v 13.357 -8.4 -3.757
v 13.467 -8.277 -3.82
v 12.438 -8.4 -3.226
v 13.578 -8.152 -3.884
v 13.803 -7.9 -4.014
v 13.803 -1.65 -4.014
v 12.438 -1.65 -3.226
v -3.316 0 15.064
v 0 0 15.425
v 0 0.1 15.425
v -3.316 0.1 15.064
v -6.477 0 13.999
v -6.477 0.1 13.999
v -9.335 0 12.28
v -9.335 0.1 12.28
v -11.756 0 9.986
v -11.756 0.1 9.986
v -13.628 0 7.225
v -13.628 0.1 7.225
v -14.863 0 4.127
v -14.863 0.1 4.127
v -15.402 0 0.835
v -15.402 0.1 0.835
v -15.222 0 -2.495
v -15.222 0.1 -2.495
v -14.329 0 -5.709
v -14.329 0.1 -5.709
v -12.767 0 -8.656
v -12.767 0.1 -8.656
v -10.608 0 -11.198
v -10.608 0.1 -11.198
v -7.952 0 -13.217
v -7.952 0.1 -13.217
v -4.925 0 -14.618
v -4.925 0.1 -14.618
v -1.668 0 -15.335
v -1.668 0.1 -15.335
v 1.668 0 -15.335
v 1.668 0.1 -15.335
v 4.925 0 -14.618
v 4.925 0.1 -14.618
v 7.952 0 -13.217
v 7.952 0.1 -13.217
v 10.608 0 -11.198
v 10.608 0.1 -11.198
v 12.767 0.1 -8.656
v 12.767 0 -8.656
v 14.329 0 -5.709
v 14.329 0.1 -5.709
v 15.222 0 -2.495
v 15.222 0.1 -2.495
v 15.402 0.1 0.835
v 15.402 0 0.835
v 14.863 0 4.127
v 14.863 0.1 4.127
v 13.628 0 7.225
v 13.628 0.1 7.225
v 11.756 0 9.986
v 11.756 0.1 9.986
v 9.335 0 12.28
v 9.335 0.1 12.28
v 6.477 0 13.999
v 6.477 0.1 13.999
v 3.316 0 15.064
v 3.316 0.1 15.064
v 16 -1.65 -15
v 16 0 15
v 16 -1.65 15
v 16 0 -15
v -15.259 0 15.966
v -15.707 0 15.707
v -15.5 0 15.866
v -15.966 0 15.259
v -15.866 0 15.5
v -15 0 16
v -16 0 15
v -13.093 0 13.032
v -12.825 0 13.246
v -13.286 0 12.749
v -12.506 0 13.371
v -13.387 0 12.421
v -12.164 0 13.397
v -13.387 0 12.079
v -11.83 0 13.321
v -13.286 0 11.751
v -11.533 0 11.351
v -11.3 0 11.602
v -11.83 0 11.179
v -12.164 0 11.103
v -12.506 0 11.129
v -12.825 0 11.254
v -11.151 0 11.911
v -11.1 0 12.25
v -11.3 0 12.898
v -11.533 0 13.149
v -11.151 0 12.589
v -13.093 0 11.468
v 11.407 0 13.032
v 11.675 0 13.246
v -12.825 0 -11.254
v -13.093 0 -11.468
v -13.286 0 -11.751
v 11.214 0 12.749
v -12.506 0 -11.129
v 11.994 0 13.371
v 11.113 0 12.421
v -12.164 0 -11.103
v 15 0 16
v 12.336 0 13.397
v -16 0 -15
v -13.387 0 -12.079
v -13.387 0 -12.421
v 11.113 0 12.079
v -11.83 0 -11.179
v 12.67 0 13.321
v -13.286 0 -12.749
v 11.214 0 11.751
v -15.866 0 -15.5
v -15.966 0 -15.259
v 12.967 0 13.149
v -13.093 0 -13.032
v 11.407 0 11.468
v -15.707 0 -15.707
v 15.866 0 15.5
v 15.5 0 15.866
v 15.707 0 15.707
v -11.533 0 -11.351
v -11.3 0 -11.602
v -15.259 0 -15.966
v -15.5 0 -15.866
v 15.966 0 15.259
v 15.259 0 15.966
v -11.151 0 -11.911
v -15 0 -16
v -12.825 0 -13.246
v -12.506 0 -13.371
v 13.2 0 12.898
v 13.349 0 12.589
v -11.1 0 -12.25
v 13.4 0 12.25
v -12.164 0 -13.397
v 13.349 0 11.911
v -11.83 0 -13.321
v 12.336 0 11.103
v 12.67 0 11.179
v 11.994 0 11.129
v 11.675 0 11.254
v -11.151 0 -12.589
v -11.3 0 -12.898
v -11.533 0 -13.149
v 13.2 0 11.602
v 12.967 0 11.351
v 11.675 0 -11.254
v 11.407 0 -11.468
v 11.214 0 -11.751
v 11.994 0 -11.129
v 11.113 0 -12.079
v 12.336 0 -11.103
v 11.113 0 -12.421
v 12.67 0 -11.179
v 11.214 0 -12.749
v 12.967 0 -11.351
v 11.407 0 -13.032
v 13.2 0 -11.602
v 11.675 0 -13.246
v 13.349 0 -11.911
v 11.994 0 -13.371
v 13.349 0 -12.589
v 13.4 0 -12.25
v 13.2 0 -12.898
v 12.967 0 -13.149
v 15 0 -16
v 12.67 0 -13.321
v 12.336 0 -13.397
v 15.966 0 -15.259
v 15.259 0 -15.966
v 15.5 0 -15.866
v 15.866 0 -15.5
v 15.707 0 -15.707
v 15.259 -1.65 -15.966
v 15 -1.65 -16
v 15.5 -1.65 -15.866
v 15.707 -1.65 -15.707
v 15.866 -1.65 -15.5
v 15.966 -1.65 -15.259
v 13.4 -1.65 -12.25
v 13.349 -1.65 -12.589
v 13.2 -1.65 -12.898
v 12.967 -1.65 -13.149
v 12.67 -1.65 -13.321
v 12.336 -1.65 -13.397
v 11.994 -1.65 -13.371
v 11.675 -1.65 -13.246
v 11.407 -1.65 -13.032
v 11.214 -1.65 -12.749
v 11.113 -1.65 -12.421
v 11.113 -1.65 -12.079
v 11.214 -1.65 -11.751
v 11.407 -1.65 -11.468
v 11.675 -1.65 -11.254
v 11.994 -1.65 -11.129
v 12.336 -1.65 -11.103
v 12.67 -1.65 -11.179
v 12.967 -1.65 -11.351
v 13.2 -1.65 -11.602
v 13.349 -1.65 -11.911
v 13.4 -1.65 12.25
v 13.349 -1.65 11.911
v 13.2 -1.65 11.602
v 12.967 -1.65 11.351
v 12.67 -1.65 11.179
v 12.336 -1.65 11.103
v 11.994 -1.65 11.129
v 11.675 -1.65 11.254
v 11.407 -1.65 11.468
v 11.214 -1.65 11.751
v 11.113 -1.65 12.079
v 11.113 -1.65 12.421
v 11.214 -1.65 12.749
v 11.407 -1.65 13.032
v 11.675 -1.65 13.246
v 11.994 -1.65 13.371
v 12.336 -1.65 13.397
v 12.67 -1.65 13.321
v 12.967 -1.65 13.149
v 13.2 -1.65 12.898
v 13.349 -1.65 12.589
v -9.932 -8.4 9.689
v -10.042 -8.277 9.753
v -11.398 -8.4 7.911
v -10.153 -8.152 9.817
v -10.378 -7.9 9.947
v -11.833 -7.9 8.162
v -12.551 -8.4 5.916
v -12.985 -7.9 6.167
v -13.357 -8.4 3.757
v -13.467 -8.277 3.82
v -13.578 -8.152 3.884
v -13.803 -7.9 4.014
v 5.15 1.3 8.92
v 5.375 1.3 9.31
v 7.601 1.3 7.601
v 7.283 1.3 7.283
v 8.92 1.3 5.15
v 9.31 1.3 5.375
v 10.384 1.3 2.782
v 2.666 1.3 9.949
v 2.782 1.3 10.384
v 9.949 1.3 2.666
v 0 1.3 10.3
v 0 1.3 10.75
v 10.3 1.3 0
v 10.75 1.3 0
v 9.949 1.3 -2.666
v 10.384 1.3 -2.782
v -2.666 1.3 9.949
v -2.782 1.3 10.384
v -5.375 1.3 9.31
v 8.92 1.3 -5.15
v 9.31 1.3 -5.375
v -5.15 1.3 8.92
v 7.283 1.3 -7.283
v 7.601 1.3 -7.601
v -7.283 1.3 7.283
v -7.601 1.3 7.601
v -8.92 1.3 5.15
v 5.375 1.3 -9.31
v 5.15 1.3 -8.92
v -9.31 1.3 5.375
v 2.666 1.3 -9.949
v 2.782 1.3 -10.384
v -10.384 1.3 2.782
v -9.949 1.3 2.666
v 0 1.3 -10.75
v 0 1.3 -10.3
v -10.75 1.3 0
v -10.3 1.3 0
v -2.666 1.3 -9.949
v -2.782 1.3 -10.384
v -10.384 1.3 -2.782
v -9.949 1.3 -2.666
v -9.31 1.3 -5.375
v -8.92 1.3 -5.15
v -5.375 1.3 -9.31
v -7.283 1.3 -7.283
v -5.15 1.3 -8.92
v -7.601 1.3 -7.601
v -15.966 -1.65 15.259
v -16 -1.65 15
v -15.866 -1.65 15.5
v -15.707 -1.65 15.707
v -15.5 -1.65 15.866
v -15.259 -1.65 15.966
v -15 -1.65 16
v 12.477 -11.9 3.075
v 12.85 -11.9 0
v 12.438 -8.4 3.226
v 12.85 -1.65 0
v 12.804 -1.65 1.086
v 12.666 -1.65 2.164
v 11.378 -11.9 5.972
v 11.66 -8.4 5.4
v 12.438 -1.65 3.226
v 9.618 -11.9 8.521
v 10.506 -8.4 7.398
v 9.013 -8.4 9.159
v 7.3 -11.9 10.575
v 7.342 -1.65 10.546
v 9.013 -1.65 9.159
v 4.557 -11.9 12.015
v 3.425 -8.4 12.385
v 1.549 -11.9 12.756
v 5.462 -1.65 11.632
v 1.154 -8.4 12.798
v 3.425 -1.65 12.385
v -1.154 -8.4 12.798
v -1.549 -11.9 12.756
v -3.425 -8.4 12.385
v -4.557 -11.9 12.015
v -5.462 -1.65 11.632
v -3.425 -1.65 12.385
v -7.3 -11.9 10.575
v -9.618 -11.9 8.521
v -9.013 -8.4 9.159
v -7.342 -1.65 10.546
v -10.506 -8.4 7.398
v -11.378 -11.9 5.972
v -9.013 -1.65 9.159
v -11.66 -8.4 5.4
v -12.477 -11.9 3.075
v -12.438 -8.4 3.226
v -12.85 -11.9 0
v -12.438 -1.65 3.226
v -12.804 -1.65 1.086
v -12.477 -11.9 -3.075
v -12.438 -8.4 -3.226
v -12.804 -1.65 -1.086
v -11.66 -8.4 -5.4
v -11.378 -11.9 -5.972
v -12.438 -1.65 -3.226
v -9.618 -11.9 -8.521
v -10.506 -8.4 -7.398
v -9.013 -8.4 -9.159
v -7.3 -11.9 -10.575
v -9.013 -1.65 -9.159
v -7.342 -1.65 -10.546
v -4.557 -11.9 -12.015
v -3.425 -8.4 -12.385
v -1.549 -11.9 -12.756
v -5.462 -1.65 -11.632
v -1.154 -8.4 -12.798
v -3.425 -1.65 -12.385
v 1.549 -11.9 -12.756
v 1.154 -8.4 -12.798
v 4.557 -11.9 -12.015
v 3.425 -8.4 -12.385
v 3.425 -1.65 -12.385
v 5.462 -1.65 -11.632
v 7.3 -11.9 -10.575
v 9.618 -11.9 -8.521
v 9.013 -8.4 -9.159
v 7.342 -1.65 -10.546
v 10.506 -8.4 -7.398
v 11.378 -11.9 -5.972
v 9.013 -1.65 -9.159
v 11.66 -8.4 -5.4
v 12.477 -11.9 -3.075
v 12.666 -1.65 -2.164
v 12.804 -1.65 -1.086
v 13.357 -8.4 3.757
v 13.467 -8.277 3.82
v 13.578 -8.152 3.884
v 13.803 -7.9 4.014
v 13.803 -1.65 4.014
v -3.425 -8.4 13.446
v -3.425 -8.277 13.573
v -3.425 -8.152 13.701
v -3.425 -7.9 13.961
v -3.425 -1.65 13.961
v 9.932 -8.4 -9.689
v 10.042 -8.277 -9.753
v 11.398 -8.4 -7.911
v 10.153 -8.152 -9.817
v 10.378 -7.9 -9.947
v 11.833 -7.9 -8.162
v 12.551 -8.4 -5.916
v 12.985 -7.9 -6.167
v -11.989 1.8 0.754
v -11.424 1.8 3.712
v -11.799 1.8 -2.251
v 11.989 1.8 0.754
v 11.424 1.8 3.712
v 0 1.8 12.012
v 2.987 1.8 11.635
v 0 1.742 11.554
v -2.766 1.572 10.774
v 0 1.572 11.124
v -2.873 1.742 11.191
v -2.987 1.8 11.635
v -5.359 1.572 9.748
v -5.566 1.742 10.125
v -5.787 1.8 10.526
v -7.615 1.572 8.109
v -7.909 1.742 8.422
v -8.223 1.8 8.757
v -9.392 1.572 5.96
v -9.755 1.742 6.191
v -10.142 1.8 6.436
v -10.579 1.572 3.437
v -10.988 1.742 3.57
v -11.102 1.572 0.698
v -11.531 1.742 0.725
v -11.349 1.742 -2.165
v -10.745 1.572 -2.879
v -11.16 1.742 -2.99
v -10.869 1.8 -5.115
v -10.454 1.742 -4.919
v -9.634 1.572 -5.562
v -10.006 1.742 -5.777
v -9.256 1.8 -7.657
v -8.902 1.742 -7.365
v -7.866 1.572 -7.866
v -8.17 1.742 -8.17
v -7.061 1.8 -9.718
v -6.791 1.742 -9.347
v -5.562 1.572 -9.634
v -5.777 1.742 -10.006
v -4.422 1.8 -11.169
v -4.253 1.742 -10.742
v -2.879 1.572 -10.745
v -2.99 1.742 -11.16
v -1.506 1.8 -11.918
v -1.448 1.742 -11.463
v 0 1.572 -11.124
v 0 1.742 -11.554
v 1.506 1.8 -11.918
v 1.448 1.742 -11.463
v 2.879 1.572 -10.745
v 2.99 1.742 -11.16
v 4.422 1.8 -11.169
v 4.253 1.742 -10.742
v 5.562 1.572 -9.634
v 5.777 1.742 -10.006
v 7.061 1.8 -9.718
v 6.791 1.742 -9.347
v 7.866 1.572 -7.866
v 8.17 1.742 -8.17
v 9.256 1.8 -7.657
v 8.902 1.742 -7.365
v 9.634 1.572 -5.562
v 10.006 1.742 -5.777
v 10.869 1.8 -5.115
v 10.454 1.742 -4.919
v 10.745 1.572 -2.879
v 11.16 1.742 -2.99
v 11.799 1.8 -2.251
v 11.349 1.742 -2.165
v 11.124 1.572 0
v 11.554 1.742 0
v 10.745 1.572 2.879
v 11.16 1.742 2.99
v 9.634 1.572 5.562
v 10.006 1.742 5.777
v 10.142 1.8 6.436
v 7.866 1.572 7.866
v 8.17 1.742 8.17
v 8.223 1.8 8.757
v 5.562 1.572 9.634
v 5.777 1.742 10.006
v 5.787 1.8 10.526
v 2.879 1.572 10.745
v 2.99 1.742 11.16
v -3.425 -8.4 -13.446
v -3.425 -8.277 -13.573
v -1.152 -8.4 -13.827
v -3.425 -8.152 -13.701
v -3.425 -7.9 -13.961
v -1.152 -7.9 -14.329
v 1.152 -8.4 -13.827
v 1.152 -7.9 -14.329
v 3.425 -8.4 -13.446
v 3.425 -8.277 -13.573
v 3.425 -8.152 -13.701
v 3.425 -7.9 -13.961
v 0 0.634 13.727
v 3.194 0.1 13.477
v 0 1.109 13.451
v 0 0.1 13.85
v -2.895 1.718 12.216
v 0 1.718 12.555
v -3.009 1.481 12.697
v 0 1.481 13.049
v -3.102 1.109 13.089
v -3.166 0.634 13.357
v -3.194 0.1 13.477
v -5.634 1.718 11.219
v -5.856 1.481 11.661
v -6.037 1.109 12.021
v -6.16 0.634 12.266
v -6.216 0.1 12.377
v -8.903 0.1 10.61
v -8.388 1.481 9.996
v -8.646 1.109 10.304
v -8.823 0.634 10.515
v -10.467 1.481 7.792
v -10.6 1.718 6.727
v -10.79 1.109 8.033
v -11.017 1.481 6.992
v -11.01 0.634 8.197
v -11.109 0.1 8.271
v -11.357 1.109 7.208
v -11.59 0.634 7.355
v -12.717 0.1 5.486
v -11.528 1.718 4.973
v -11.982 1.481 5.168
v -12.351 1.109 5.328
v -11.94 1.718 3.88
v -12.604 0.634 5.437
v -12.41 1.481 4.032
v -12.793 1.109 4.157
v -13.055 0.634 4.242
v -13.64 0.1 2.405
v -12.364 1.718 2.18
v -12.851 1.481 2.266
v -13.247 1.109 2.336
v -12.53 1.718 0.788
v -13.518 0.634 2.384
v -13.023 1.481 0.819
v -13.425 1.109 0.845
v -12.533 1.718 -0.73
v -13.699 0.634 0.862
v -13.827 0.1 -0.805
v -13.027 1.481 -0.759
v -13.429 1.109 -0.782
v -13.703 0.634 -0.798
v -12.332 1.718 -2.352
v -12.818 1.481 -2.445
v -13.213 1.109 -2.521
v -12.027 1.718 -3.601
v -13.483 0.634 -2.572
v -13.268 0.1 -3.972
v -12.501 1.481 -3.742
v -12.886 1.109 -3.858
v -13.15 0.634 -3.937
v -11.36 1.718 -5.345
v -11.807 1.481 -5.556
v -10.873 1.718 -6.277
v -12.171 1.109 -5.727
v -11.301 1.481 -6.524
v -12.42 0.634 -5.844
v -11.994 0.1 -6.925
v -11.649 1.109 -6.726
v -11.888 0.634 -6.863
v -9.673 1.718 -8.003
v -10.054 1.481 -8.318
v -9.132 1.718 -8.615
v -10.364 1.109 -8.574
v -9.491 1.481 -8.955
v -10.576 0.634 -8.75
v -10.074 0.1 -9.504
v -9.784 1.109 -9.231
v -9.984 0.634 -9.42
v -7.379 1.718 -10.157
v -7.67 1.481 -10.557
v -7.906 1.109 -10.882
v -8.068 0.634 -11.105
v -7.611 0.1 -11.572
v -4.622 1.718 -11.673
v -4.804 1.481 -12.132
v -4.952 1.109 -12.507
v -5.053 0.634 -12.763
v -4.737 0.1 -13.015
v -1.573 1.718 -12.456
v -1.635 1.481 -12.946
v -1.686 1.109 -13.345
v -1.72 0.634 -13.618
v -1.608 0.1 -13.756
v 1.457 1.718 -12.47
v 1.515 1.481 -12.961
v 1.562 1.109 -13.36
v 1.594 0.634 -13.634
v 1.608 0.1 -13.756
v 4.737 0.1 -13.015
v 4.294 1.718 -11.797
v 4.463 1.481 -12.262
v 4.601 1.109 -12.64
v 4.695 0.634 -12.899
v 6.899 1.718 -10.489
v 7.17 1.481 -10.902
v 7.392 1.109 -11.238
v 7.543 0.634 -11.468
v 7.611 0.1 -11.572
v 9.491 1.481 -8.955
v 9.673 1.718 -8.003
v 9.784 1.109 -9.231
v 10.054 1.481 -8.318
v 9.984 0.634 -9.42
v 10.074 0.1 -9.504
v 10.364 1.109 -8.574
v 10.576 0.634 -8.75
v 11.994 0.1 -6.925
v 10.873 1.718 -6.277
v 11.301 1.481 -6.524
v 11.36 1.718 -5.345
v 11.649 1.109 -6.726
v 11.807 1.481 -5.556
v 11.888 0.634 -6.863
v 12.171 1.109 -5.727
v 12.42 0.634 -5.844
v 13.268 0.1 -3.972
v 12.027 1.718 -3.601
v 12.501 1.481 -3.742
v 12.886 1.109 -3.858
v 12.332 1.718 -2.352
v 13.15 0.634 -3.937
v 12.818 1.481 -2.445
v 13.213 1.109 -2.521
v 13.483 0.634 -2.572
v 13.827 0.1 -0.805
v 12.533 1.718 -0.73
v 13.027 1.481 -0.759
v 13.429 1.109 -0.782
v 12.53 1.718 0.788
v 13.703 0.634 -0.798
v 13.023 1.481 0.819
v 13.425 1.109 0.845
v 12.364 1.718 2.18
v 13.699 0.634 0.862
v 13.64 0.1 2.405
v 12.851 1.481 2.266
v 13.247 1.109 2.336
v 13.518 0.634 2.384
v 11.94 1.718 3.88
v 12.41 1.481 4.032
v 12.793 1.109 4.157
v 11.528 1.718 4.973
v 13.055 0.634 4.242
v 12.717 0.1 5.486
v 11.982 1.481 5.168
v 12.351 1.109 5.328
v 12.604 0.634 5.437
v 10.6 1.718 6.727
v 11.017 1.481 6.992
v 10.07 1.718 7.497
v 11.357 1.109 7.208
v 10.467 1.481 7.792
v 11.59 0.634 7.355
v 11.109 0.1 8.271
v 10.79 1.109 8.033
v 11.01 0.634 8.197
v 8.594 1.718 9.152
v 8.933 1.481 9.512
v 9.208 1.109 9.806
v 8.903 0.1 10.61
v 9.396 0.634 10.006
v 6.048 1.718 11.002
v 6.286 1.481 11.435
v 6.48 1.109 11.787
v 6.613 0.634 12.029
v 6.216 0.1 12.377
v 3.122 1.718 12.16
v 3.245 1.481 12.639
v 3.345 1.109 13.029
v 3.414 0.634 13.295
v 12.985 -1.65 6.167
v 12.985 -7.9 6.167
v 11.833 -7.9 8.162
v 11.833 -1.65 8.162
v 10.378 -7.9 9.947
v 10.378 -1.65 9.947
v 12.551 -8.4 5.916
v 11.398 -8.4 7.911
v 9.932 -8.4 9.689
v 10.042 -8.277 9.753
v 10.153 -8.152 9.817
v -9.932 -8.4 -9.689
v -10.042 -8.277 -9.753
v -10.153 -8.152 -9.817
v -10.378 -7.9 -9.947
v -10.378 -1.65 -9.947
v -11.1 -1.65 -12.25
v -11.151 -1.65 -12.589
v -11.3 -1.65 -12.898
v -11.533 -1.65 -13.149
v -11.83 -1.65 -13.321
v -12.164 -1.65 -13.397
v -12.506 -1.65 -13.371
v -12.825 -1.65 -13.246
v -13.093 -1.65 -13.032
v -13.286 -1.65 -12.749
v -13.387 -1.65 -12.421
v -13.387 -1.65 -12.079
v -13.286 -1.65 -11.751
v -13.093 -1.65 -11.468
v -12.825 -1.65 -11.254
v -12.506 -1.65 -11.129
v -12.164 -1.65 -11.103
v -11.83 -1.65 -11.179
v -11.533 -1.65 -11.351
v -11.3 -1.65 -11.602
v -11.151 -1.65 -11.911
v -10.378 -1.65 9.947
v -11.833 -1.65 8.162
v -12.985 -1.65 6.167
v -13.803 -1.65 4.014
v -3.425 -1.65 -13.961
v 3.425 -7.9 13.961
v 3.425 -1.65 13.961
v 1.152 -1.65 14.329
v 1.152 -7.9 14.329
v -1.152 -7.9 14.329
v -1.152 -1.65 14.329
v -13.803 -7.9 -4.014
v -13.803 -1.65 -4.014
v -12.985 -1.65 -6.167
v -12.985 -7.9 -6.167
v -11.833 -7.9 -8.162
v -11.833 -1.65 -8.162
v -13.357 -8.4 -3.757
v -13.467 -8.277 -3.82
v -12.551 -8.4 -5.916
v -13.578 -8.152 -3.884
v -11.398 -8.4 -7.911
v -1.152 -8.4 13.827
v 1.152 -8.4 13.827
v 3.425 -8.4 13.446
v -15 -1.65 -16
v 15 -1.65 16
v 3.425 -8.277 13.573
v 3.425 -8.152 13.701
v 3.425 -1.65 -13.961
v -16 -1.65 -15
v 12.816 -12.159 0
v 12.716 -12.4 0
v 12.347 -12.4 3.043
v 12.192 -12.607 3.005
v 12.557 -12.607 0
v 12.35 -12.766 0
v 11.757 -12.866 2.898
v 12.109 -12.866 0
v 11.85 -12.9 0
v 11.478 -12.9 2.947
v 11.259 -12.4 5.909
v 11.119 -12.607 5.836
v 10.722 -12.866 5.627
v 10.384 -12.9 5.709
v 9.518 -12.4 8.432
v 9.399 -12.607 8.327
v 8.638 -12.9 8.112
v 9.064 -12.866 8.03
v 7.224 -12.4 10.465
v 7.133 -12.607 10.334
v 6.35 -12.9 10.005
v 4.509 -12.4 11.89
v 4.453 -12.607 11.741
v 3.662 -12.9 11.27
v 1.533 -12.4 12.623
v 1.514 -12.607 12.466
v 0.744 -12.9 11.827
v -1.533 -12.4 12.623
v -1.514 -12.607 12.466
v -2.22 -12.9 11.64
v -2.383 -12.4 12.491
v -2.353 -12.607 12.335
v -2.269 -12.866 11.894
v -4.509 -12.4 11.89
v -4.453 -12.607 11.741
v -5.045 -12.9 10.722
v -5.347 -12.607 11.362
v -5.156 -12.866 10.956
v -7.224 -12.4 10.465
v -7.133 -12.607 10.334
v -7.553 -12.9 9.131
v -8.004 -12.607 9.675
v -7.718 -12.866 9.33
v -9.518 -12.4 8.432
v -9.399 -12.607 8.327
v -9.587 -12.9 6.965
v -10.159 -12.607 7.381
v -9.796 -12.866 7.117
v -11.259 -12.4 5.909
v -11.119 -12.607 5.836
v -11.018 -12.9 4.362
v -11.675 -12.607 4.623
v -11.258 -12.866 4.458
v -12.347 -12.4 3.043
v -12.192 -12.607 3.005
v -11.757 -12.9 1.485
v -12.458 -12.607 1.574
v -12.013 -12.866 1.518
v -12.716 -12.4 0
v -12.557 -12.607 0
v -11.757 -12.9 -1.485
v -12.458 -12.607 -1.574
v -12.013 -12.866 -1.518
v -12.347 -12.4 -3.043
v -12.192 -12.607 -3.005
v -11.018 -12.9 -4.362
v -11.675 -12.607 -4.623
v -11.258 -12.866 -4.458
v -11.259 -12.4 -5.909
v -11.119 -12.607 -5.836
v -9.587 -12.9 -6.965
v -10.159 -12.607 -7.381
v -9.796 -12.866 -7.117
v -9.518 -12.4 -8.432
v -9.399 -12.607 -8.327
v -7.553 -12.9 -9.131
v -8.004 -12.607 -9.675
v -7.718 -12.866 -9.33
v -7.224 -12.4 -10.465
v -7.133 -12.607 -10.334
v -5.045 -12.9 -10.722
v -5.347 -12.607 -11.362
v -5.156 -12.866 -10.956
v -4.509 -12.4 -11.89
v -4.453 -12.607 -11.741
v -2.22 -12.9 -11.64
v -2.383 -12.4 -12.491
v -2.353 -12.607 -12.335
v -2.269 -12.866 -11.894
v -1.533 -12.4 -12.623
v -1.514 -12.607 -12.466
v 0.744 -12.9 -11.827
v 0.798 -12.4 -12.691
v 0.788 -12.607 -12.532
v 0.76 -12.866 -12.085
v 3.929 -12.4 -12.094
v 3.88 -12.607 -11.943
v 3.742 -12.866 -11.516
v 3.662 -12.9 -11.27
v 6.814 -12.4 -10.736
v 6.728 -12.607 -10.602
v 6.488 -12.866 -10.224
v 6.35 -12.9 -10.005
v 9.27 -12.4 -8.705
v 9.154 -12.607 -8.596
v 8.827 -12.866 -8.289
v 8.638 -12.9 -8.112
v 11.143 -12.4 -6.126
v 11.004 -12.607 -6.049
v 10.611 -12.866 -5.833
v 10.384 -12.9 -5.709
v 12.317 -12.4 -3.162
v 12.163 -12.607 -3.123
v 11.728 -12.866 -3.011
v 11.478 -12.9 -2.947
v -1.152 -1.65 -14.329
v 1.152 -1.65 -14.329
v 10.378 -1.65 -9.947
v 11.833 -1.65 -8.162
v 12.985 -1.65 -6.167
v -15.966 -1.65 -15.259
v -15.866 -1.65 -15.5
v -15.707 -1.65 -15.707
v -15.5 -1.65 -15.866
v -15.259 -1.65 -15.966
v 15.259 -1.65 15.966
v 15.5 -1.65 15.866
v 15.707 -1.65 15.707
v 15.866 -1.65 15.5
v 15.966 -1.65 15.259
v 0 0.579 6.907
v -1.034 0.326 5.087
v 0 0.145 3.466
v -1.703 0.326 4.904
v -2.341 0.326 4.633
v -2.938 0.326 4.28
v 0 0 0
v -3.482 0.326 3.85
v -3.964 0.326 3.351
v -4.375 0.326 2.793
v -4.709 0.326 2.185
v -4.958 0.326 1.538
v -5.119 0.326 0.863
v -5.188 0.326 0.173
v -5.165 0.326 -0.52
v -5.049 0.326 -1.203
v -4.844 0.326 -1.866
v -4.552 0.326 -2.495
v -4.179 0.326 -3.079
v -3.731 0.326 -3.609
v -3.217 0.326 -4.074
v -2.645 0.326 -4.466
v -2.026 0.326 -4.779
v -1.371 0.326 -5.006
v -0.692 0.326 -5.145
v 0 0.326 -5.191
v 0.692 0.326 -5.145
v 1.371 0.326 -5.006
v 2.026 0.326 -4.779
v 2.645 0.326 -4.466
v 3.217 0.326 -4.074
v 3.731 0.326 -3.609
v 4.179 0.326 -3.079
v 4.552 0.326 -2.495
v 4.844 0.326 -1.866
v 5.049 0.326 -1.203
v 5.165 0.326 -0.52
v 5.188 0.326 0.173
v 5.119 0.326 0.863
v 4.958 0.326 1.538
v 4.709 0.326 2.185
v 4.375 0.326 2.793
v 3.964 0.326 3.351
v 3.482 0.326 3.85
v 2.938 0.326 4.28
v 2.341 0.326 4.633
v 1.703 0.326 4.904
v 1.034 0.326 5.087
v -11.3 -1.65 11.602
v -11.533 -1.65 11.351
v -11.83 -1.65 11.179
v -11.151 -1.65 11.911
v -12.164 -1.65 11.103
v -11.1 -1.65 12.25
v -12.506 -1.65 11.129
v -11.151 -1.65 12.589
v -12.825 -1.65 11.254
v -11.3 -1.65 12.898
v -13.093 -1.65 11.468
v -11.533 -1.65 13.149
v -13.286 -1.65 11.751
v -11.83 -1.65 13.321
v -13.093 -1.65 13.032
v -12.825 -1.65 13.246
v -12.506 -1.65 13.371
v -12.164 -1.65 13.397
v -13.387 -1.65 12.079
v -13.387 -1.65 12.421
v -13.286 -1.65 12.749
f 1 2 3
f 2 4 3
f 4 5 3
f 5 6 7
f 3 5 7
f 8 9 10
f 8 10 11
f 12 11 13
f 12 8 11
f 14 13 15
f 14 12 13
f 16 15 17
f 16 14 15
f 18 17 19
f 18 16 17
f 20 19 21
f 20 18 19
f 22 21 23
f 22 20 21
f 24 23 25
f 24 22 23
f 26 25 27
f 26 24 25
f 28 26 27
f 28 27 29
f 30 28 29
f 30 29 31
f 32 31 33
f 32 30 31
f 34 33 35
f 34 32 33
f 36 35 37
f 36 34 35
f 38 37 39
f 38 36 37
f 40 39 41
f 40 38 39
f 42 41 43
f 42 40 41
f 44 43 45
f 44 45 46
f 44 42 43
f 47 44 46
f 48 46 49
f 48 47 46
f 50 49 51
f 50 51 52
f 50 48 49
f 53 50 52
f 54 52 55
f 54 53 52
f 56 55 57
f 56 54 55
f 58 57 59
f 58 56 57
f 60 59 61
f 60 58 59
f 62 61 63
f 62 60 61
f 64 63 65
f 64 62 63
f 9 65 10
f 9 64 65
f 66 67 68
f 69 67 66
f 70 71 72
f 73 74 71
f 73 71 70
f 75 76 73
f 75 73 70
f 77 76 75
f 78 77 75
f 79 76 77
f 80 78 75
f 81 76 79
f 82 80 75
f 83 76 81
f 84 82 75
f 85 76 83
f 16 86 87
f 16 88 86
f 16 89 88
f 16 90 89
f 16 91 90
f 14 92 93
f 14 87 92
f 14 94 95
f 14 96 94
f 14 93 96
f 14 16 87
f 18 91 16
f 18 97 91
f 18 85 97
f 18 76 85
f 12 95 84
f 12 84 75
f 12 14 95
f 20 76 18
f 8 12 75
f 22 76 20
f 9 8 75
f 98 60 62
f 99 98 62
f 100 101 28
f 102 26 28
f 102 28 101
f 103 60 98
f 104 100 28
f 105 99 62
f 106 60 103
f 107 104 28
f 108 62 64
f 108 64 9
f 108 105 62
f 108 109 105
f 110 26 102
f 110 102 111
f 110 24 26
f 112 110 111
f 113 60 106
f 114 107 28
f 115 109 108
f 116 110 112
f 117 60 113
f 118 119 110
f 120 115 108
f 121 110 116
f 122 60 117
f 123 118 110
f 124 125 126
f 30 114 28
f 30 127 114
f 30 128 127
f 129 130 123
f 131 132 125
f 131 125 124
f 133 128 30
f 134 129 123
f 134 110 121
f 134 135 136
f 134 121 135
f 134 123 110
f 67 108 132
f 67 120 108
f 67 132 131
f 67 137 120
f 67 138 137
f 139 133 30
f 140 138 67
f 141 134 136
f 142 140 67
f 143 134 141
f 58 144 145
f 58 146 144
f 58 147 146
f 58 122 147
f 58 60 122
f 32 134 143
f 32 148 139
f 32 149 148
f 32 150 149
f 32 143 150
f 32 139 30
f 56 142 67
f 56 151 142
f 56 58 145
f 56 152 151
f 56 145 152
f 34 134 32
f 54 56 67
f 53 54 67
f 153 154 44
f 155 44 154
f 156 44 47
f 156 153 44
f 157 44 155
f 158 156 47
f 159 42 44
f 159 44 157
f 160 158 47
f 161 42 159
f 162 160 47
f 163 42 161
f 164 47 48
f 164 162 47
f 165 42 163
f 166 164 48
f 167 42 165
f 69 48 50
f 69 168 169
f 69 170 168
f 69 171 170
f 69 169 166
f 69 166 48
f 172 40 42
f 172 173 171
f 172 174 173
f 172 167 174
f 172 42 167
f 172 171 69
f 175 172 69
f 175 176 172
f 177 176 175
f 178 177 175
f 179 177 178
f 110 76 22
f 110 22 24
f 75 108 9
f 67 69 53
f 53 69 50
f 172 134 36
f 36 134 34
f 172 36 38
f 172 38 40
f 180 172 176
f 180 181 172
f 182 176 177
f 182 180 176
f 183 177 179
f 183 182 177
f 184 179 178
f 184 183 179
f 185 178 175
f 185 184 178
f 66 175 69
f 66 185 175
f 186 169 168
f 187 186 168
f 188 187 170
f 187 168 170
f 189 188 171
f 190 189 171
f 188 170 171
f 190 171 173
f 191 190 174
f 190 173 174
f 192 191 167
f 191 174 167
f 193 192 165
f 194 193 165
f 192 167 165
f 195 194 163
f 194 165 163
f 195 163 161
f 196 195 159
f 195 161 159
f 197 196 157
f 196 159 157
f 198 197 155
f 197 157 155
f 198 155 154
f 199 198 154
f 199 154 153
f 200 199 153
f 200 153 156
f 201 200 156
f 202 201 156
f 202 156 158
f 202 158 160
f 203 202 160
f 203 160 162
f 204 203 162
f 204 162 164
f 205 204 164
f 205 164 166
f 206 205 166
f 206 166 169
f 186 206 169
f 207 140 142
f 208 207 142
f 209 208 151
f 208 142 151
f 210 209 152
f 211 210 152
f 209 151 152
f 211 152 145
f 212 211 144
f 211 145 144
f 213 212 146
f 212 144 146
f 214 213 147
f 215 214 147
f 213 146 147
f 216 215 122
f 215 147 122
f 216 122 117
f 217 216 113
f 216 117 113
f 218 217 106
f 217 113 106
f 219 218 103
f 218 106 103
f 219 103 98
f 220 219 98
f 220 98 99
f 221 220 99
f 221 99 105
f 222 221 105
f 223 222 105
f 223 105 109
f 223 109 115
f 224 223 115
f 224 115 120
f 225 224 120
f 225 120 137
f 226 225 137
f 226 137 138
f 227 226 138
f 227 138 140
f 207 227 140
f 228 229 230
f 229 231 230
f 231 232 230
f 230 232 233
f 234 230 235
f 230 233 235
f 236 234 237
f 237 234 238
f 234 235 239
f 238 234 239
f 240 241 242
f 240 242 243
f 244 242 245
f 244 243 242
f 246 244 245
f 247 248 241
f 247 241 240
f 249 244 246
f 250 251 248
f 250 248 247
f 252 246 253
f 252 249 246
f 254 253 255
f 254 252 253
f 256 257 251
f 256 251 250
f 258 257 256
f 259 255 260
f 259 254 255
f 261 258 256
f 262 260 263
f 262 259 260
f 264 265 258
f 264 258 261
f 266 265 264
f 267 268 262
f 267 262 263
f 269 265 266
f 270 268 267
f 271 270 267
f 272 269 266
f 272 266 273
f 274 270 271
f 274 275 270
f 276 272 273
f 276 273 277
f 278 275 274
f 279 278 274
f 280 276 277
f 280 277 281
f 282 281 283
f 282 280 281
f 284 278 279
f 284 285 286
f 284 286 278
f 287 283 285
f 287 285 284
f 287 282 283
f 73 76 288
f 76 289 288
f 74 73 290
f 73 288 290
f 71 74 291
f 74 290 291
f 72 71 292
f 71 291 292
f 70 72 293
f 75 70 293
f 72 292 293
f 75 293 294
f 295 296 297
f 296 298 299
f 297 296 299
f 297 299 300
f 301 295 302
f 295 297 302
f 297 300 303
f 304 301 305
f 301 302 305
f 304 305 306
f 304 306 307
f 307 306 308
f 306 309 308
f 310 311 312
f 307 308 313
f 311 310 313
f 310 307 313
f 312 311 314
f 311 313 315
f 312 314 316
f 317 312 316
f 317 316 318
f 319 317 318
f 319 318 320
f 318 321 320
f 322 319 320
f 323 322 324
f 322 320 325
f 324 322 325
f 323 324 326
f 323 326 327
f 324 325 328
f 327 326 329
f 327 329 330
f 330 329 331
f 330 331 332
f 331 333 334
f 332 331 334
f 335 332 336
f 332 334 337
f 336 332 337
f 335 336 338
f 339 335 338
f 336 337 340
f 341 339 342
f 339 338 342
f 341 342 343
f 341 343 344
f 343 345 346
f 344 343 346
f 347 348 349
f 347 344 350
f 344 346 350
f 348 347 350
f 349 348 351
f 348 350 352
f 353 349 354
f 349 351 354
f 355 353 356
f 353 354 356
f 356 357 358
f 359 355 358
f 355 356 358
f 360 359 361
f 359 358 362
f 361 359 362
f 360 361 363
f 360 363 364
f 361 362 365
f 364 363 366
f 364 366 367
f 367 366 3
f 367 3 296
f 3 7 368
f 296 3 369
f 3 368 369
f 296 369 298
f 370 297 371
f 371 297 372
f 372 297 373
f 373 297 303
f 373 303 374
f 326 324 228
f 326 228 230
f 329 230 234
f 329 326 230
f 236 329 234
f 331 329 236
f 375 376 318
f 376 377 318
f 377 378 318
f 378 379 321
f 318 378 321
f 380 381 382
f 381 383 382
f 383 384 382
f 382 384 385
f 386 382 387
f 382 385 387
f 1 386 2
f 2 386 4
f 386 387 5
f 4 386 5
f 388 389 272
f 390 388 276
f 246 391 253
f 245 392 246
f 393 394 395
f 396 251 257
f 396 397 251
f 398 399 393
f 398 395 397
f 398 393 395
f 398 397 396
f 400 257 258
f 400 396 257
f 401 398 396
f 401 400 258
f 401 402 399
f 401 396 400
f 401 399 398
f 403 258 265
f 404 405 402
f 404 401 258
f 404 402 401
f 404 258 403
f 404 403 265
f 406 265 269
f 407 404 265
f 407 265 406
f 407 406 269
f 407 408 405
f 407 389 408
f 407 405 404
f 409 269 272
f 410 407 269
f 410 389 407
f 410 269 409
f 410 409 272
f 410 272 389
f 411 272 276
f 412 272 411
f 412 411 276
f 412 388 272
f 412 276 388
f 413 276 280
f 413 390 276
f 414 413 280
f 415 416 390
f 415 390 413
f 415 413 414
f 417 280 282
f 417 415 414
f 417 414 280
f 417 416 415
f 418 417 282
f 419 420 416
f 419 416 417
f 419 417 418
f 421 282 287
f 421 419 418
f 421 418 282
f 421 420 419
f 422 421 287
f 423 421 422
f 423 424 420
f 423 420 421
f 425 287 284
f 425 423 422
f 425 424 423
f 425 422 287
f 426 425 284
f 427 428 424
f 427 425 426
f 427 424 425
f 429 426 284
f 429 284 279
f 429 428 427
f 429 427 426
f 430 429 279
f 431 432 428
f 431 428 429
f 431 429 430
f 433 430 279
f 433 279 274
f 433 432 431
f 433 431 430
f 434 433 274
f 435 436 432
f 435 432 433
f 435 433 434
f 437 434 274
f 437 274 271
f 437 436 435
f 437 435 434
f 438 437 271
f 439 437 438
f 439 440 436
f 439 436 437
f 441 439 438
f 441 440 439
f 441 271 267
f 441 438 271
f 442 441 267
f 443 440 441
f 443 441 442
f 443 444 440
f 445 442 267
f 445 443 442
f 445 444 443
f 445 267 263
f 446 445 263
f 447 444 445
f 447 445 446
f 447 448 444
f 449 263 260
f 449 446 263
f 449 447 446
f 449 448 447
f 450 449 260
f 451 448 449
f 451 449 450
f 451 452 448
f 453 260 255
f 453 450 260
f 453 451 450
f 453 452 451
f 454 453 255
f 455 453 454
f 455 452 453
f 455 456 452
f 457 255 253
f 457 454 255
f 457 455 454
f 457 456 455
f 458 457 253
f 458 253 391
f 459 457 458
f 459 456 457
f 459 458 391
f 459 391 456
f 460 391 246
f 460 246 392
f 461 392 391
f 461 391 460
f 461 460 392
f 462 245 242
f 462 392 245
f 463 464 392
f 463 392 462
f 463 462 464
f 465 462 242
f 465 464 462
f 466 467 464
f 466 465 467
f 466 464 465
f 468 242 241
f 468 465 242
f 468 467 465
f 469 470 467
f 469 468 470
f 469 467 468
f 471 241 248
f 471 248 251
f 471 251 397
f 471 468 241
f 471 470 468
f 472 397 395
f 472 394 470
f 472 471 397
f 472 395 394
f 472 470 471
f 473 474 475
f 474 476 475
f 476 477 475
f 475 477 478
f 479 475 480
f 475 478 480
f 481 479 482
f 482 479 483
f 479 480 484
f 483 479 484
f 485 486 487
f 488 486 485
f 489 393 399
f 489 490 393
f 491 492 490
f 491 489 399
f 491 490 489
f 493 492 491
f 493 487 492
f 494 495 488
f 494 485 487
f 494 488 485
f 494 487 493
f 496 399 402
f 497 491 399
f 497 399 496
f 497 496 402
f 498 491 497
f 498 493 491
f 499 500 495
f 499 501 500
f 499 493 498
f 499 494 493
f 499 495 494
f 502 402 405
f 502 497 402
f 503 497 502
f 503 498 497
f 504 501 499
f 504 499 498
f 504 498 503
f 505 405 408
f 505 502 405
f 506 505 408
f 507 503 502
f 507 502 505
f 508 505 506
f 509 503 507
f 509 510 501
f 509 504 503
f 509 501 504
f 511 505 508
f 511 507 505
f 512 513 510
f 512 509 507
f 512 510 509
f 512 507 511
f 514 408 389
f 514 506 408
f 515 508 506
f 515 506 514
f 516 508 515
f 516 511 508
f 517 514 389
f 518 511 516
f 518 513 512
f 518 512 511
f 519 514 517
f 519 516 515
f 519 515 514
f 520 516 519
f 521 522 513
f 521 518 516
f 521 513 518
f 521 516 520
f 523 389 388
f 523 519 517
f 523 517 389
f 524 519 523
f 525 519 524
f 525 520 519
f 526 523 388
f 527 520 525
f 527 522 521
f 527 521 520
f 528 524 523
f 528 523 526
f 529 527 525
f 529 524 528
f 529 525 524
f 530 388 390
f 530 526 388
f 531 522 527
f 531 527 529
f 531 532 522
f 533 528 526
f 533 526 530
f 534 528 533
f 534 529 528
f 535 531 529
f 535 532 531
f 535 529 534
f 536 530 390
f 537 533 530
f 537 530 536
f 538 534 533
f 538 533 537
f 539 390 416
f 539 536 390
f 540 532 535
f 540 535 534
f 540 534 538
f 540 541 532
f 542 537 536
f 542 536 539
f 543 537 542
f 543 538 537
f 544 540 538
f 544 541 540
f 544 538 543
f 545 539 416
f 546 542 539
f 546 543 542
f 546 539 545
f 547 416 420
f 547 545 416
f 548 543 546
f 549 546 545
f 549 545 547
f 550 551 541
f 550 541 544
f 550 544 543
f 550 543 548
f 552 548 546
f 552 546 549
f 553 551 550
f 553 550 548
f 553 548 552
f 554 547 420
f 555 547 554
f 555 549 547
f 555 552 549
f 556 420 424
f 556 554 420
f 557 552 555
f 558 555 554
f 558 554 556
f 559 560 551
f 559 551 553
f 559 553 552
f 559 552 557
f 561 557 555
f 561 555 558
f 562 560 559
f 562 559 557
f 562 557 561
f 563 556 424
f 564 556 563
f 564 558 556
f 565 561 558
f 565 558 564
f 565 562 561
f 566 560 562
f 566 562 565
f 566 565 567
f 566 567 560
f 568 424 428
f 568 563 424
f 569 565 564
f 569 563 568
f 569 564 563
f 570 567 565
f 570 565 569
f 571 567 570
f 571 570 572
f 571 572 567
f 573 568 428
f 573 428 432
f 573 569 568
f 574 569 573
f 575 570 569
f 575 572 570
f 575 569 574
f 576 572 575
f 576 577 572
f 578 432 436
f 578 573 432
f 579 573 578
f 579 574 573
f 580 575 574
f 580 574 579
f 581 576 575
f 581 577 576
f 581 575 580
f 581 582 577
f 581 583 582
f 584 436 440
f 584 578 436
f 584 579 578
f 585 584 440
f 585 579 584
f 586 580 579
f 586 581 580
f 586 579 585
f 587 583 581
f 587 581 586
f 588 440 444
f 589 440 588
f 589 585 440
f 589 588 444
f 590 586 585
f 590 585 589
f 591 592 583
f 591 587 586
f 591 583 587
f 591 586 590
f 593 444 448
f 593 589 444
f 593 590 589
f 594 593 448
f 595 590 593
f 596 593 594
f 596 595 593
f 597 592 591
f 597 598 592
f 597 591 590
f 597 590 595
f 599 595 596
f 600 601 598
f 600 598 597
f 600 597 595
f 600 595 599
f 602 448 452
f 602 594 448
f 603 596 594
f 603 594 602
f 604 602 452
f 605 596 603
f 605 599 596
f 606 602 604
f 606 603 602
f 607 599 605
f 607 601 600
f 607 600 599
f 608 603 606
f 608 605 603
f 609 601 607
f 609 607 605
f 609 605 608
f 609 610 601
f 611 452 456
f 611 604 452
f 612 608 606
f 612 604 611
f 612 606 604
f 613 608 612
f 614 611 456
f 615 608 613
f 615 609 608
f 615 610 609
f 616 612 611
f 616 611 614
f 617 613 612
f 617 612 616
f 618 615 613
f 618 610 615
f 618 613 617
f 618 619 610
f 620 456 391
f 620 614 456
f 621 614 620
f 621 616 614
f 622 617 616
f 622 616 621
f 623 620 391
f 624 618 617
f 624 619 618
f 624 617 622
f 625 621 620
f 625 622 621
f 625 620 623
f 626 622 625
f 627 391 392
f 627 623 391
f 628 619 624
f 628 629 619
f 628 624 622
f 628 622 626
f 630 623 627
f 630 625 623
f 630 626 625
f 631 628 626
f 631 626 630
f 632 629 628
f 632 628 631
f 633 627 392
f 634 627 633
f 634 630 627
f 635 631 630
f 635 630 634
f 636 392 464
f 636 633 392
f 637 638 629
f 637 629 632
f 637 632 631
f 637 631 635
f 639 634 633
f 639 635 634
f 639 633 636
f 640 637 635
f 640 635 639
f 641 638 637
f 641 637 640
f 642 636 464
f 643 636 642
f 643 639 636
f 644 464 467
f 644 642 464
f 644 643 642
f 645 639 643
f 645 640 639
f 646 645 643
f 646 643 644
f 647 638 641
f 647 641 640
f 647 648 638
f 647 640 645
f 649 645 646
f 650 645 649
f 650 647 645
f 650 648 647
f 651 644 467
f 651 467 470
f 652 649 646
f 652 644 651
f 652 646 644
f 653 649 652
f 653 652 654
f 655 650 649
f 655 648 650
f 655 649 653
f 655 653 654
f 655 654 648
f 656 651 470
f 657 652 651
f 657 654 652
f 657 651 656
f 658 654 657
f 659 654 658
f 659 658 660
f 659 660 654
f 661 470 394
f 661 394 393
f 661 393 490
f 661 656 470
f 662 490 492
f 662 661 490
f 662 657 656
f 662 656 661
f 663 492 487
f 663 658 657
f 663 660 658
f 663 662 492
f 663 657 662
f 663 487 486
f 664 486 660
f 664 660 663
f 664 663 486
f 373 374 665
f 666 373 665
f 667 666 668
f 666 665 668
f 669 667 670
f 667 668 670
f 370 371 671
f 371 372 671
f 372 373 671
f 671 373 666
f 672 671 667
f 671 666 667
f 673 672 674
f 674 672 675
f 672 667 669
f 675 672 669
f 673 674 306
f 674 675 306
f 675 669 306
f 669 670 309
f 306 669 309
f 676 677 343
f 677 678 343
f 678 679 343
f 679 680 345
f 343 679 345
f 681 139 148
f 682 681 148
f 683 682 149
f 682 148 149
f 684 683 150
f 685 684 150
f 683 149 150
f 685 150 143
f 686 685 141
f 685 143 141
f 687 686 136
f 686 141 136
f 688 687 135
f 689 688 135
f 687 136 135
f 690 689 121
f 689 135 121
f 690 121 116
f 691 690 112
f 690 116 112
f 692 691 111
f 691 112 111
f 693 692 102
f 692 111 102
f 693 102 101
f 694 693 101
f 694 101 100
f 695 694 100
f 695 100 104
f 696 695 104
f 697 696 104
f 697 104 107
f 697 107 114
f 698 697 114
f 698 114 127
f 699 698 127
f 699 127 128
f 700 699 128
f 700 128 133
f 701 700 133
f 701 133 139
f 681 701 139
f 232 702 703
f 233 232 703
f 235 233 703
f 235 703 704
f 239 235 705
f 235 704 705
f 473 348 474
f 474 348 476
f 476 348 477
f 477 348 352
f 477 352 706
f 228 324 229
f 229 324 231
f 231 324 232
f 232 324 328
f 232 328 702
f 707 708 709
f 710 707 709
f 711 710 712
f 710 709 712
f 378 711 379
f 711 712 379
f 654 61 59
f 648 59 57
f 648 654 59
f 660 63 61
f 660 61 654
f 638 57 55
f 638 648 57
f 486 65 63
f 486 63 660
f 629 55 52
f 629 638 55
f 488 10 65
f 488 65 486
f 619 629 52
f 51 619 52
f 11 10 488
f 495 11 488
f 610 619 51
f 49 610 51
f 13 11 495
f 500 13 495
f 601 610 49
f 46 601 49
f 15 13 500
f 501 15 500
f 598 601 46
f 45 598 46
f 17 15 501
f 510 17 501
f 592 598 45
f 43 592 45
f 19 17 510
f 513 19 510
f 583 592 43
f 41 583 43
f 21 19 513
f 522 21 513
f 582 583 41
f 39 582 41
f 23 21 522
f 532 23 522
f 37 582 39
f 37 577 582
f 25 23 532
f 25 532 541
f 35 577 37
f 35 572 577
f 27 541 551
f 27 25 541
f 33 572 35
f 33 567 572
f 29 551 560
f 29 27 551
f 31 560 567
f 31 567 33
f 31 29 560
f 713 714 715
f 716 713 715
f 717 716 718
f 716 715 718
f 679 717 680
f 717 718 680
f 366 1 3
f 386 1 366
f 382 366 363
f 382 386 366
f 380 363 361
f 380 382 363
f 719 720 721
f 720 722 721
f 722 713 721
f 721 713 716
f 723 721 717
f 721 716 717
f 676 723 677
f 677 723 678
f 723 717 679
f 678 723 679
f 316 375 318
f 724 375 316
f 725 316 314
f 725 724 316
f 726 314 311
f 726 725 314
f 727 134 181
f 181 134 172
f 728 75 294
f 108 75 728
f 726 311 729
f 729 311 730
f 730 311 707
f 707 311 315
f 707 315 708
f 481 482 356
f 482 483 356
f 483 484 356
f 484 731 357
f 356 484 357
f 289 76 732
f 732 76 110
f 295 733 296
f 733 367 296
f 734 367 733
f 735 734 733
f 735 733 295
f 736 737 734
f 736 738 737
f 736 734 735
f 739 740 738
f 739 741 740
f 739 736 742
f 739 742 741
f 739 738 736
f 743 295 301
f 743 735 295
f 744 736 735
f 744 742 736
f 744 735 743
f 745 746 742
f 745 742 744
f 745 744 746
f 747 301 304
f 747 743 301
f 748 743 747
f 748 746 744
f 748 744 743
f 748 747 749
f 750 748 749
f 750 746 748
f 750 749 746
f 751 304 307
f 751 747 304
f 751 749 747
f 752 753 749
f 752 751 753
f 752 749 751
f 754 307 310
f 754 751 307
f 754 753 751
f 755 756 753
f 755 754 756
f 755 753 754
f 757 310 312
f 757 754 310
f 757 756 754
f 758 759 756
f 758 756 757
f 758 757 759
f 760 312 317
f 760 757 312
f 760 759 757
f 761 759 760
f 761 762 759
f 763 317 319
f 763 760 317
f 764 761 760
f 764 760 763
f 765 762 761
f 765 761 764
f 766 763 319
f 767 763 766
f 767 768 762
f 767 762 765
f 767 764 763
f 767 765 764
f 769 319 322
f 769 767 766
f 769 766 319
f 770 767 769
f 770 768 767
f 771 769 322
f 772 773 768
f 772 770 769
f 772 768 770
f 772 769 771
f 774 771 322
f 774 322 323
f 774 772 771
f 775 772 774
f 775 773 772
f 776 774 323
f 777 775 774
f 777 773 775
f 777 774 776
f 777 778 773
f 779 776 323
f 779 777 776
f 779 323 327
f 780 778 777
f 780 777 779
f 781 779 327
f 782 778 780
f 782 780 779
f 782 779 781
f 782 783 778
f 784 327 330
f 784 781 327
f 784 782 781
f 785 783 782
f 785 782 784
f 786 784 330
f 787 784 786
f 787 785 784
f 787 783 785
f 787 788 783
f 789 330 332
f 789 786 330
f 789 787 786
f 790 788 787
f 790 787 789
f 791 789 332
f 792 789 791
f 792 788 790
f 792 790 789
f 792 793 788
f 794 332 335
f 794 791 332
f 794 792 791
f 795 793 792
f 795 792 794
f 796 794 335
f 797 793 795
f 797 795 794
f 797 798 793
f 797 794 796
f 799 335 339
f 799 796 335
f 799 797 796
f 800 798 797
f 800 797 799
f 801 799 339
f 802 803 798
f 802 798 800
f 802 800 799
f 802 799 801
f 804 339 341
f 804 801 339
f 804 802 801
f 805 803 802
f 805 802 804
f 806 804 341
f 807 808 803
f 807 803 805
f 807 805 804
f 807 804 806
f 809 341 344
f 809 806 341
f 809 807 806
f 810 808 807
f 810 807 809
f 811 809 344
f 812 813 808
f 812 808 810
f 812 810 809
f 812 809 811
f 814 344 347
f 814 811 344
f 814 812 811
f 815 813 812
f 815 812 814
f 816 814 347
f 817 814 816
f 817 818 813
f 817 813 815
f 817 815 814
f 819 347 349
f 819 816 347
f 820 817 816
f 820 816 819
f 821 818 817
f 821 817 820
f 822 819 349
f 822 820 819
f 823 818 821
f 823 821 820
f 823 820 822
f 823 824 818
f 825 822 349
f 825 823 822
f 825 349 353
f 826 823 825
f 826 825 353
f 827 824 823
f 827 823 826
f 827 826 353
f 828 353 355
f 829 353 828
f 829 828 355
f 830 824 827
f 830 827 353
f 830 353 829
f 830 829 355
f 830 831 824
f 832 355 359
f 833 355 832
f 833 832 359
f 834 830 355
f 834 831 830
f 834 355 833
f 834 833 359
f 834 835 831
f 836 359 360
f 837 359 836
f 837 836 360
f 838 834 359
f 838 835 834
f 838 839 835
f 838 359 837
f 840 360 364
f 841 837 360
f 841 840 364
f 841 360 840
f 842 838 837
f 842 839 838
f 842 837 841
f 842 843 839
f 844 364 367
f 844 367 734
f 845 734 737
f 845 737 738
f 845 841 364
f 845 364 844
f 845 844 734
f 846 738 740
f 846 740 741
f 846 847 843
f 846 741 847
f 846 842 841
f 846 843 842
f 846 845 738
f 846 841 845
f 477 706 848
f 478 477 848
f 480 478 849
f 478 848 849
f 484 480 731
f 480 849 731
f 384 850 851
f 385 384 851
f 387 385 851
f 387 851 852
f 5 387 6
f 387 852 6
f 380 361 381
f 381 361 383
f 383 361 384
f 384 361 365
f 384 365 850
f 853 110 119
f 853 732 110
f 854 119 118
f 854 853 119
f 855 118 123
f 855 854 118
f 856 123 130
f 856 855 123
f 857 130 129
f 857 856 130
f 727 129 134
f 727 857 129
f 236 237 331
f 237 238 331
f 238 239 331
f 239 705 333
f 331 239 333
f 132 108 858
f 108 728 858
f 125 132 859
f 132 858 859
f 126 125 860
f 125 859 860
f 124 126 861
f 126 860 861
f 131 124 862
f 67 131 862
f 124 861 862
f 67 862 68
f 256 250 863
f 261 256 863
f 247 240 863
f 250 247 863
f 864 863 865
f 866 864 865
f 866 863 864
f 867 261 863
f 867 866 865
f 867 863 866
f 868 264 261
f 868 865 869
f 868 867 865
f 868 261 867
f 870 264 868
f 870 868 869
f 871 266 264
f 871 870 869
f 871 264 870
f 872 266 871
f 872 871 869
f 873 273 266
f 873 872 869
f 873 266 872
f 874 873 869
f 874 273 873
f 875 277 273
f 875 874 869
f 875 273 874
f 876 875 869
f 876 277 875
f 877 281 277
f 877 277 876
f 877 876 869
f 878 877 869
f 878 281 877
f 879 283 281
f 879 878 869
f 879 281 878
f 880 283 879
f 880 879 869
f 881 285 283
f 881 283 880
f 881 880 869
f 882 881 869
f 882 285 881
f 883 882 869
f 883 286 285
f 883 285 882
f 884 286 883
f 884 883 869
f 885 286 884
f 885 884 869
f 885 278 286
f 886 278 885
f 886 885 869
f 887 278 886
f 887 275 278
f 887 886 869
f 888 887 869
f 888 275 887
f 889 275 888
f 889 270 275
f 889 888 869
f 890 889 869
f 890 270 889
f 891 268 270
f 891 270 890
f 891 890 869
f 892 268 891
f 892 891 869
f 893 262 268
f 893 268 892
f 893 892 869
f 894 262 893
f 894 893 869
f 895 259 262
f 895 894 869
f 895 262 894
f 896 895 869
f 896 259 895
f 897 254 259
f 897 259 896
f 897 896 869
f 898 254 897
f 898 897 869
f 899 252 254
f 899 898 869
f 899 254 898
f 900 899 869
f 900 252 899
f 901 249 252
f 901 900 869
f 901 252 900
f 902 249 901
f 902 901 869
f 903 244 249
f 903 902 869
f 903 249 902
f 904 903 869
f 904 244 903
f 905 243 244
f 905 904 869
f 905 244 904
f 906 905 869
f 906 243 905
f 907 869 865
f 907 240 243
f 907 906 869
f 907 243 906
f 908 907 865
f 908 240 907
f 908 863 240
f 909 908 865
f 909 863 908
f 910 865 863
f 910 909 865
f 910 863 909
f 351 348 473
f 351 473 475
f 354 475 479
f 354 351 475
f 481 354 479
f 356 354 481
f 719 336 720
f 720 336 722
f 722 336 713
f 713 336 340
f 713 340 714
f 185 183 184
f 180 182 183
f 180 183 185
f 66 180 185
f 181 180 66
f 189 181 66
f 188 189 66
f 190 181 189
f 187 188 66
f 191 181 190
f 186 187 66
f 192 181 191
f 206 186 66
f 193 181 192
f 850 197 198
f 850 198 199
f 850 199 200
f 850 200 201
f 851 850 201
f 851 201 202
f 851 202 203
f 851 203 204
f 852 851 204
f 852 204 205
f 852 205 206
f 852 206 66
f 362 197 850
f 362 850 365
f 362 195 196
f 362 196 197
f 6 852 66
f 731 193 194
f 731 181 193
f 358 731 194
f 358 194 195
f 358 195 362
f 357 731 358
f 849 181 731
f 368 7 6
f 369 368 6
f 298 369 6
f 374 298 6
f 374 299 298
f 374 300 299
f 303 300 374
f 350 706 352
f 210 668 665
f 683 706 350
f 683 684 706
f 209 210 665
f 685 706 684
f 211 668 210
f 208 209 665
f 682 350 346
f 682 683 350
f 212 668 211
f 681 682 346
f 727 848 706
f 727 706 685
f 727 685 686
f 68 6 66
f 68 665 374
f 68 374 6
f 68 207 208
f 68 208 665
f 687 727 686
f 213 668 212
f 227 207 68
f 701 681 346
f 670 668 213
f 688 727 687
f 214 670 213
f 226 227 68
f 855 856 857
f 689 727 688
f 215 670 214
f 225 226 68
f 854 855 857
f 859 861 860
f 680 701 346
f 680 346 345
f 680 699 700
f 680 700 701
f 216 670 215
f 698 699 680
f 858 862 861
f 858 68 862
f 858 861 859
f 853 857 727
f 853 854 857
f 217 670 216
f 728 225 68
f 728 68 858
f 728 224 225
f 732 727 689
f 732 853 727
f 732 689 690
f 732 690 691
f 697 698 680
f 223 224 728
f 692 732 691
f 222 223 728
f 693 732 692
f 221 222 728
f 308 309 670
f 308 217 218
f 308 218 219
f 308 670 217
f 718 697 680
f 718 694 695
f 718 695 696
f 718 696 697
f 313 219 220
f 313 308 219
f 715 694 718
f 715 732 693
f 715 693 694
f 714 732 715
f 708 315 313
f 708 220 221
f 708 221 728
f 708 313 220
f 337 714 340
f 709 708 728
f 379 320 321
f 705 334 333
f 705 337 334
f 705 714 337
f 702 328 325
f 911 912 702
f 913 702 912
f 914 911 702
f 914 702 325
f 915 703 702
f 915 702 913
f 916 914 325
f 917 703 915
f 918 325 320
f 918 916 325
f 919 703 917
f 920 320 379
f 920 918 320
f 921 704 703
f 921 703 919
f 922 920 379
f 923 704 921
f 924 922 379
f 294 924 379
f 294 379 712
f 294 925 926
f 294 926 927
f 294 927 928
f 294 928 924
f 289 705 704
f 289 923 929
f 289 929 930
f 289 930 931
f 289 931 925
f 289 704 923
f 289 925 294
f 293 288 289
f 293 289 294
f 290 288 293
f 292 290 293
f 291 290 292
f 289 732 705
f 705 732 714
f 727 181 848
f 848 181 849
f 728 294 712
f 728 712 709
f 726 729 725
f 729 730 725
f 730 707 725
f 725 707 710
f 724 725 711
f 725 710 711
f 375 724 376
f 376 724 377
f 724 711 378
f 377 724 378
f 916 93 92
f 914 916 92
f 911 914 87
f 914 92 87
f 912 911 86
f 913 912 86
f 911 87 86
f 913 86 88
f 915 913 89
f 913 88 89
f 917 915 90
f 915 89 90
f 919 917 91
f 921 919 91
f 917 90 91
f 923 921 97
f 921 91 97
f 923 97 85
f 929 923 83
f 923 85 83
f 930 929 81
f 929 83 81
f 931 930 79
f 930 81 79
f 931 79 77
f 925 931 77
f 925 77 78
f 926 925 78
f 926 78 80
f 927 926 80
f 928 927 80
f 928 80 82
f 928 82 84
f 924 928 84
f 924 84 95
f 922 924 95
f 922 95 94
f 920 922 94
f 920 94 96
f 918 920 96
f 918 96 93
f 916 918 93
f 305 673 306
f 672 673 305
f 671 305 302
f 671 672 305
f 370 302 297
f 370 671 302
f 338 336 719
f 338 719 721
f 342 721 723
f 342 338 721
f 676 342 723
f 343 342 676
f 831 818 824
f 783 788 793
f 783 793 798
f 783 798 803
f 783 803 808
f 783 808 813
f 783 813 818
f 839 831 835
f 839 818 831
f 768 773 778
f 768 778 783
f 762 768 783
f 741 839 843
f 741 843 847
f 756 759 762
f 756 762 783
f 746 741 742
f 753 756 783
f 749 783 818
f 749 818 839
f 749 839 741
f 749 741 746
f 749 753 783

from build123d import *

# Parameters (mm, degrees)
SKETCH_1_W               = 32
SKETCH_1_H               = 32
EXTRUDE_1_DEPTH          = 1.65
SKETCH_3_R               = 12.85
EXTRUDE_2_DEPTH          = 11.25
EXTRUDE_3_DEPTH          = 6.75
PATTERN_CIRCULAR_1_COUNT = 6
FILLET_1_R               = 1
FILLET_2_R               = 1
SKETCH_4_R               = 1.15
CUT_EXTRUDE_2_DEPTH      = 27.04630492
CHAMFER_1_SIZE           = 0.5


with BuildPart() as part:
    # Эскиз1 → Бобышка-Вытянуть1 (new body)
    with BuildSketch(Plane(origin=(0, 0, 0), x_dir=(1, 0, 0), z_dir=(0, 1, 0))):
        Rectangle(SKETCH_1_W, SKETCH_1_H)
    extrude(amount=-EXTRUDE_1_DEPTH)

    # Эскиз2 → Повернуть2 (revolve)
    with BuildSketch(Plane(origin=(0, 0, 0), x_dir=(0, 0, -1), z_dir=(1, 0, 0))):
        with BuildLine():
            Line((0, -1.65), (0, 0))
            ThreePointArc((0, 0), (-5.190857347, 0.326284094), (-10.3, 1.3))
            Line((-10.3, 1.3), (-10.75, 1.3))
            ThreePointArc((-10.75, 1.3), (-12.677691027, 1.675701821), (-13.85, 0.1))
            Line((-13.85, 0.1), (-15.425, 0.1))
            Line((-15.425, 0.1), (-15.425, -1.65))
            Line((-15.425, -1.65), (0, -1.65))
        make_face()
    revolve(axis=Axis((0, 0, 0), (0, -1, 0)))

    # Эскиз3 → Бобышка-Вытянуть2 (add)
    with BuildSketch(Plane.XZ.offset(1.65)):
        Circle(SKETCH_3_R)
    extrude(amount=EXTRUDE_2_DEPTH)

    # Эскиз3<3> → Бобышка-Вытянуть3 (add)
    with BuildSketch(Plane.XZ.offset(1.65)):
        with BuildLine():
            ThreePointArc((-3.425, -13.961017155), (0, -14.375), (3.425, -13.961017155))
            Line((3.425, -13.961017155), (3.425, -12.385147355))
            ThreePointArc((3.425, -12.385147355), (0, -12.85), (-3.425, -12.385147355))
            Line((-3.425, -12.385147355), (-3.425, -13.961017155))
        make_face()
        with BuildLine():
            ThreePointArc((-3.425, 12.385147355), (0, 12.85), (3.425, 12.385147355))
            Line((3.425, 12.385147355), (3.425, 13.961017155))
            ThreePointArc((3.425, 13.961017155), (0, 14.375), (-3.425, 13.961017155))
            Line((-3.425, 13.961017155), (-3.425, 12.385147355))
        make_face()
    extrude_3 = extrude(amount=EXTRUDE_3_DEPTH)

    # Круговой массив1: Бобышка-Вытянуть3 ×6 about axis
    pattern_circular_1_axis = Axis((0, -12.9, 0), (0, 1, 0))
    for i in range(1, PATTERN_CIRCULAR_1_COUNT):
        add(extrude_3.rotate(pattern_circular_1_axis, i * 360 / PATTERN_CIRCULAR_1_COUNT))

    # Скругление1
    fillet_1_edges = [part.edges().sort_by_distance(p)[0] for p in [
        (16, -0.825, 16),
        (16, -0.825, -16),
        (-16, -0.825, -16),
        (-16, -0.825, 16),
    ]]
    fillet(fillet_1_edges, radius=FILLET_1_R)

    # Скругление2
    fillet_2_edges = [part.edges().sort_by_distance(p)[0] for p in [
        (-12.85, -12.9, 0),
    ]]
    fillet(fillet_2_edges, radius=FILLET_2_R)

    # Эскиз4 → Вырез-Вытянуть2 (cut, through all)
    with BuildSketch(Plane(origin=(0, 0, 0), x_dir=(1, 0, 0), z_dir=(0, 1, 0))):
        with Locations((-12.25, 12.25)):
            Circle(SKETCH_4_R)
        with Locations((12.25, 12.25)):
            Circle(SKETCH_4_R)
        with Locations((12.25, -12.25)):
            Circle(SKETCH_4_R)
        with Locations((-12.25, -12.25)):
            Circle(SKETCH_4_R)
    extrude(amount=-CUT_EXTRUDE_2_DEPTH, mode=Mode.SUBTRACT)

    # Фаска1
    chamfer_1_edges = [part.edges().sort_by_distance(p)[0] for p in [
        (0, -8.4, -14.375),
        (12.449115179, -8.4, -7.1875),
        (12.449115179, -8.4, 7.1875),
        (0, -8.4, 14.375),
        (-12.449115179, -8.4, 7.1875),
        (-12.449115179, -8.4, -7.1875),
    ]]
    chamfer(chamfer_1_edges, length=CHAMFER_1_SIZE)


solid = part.part
